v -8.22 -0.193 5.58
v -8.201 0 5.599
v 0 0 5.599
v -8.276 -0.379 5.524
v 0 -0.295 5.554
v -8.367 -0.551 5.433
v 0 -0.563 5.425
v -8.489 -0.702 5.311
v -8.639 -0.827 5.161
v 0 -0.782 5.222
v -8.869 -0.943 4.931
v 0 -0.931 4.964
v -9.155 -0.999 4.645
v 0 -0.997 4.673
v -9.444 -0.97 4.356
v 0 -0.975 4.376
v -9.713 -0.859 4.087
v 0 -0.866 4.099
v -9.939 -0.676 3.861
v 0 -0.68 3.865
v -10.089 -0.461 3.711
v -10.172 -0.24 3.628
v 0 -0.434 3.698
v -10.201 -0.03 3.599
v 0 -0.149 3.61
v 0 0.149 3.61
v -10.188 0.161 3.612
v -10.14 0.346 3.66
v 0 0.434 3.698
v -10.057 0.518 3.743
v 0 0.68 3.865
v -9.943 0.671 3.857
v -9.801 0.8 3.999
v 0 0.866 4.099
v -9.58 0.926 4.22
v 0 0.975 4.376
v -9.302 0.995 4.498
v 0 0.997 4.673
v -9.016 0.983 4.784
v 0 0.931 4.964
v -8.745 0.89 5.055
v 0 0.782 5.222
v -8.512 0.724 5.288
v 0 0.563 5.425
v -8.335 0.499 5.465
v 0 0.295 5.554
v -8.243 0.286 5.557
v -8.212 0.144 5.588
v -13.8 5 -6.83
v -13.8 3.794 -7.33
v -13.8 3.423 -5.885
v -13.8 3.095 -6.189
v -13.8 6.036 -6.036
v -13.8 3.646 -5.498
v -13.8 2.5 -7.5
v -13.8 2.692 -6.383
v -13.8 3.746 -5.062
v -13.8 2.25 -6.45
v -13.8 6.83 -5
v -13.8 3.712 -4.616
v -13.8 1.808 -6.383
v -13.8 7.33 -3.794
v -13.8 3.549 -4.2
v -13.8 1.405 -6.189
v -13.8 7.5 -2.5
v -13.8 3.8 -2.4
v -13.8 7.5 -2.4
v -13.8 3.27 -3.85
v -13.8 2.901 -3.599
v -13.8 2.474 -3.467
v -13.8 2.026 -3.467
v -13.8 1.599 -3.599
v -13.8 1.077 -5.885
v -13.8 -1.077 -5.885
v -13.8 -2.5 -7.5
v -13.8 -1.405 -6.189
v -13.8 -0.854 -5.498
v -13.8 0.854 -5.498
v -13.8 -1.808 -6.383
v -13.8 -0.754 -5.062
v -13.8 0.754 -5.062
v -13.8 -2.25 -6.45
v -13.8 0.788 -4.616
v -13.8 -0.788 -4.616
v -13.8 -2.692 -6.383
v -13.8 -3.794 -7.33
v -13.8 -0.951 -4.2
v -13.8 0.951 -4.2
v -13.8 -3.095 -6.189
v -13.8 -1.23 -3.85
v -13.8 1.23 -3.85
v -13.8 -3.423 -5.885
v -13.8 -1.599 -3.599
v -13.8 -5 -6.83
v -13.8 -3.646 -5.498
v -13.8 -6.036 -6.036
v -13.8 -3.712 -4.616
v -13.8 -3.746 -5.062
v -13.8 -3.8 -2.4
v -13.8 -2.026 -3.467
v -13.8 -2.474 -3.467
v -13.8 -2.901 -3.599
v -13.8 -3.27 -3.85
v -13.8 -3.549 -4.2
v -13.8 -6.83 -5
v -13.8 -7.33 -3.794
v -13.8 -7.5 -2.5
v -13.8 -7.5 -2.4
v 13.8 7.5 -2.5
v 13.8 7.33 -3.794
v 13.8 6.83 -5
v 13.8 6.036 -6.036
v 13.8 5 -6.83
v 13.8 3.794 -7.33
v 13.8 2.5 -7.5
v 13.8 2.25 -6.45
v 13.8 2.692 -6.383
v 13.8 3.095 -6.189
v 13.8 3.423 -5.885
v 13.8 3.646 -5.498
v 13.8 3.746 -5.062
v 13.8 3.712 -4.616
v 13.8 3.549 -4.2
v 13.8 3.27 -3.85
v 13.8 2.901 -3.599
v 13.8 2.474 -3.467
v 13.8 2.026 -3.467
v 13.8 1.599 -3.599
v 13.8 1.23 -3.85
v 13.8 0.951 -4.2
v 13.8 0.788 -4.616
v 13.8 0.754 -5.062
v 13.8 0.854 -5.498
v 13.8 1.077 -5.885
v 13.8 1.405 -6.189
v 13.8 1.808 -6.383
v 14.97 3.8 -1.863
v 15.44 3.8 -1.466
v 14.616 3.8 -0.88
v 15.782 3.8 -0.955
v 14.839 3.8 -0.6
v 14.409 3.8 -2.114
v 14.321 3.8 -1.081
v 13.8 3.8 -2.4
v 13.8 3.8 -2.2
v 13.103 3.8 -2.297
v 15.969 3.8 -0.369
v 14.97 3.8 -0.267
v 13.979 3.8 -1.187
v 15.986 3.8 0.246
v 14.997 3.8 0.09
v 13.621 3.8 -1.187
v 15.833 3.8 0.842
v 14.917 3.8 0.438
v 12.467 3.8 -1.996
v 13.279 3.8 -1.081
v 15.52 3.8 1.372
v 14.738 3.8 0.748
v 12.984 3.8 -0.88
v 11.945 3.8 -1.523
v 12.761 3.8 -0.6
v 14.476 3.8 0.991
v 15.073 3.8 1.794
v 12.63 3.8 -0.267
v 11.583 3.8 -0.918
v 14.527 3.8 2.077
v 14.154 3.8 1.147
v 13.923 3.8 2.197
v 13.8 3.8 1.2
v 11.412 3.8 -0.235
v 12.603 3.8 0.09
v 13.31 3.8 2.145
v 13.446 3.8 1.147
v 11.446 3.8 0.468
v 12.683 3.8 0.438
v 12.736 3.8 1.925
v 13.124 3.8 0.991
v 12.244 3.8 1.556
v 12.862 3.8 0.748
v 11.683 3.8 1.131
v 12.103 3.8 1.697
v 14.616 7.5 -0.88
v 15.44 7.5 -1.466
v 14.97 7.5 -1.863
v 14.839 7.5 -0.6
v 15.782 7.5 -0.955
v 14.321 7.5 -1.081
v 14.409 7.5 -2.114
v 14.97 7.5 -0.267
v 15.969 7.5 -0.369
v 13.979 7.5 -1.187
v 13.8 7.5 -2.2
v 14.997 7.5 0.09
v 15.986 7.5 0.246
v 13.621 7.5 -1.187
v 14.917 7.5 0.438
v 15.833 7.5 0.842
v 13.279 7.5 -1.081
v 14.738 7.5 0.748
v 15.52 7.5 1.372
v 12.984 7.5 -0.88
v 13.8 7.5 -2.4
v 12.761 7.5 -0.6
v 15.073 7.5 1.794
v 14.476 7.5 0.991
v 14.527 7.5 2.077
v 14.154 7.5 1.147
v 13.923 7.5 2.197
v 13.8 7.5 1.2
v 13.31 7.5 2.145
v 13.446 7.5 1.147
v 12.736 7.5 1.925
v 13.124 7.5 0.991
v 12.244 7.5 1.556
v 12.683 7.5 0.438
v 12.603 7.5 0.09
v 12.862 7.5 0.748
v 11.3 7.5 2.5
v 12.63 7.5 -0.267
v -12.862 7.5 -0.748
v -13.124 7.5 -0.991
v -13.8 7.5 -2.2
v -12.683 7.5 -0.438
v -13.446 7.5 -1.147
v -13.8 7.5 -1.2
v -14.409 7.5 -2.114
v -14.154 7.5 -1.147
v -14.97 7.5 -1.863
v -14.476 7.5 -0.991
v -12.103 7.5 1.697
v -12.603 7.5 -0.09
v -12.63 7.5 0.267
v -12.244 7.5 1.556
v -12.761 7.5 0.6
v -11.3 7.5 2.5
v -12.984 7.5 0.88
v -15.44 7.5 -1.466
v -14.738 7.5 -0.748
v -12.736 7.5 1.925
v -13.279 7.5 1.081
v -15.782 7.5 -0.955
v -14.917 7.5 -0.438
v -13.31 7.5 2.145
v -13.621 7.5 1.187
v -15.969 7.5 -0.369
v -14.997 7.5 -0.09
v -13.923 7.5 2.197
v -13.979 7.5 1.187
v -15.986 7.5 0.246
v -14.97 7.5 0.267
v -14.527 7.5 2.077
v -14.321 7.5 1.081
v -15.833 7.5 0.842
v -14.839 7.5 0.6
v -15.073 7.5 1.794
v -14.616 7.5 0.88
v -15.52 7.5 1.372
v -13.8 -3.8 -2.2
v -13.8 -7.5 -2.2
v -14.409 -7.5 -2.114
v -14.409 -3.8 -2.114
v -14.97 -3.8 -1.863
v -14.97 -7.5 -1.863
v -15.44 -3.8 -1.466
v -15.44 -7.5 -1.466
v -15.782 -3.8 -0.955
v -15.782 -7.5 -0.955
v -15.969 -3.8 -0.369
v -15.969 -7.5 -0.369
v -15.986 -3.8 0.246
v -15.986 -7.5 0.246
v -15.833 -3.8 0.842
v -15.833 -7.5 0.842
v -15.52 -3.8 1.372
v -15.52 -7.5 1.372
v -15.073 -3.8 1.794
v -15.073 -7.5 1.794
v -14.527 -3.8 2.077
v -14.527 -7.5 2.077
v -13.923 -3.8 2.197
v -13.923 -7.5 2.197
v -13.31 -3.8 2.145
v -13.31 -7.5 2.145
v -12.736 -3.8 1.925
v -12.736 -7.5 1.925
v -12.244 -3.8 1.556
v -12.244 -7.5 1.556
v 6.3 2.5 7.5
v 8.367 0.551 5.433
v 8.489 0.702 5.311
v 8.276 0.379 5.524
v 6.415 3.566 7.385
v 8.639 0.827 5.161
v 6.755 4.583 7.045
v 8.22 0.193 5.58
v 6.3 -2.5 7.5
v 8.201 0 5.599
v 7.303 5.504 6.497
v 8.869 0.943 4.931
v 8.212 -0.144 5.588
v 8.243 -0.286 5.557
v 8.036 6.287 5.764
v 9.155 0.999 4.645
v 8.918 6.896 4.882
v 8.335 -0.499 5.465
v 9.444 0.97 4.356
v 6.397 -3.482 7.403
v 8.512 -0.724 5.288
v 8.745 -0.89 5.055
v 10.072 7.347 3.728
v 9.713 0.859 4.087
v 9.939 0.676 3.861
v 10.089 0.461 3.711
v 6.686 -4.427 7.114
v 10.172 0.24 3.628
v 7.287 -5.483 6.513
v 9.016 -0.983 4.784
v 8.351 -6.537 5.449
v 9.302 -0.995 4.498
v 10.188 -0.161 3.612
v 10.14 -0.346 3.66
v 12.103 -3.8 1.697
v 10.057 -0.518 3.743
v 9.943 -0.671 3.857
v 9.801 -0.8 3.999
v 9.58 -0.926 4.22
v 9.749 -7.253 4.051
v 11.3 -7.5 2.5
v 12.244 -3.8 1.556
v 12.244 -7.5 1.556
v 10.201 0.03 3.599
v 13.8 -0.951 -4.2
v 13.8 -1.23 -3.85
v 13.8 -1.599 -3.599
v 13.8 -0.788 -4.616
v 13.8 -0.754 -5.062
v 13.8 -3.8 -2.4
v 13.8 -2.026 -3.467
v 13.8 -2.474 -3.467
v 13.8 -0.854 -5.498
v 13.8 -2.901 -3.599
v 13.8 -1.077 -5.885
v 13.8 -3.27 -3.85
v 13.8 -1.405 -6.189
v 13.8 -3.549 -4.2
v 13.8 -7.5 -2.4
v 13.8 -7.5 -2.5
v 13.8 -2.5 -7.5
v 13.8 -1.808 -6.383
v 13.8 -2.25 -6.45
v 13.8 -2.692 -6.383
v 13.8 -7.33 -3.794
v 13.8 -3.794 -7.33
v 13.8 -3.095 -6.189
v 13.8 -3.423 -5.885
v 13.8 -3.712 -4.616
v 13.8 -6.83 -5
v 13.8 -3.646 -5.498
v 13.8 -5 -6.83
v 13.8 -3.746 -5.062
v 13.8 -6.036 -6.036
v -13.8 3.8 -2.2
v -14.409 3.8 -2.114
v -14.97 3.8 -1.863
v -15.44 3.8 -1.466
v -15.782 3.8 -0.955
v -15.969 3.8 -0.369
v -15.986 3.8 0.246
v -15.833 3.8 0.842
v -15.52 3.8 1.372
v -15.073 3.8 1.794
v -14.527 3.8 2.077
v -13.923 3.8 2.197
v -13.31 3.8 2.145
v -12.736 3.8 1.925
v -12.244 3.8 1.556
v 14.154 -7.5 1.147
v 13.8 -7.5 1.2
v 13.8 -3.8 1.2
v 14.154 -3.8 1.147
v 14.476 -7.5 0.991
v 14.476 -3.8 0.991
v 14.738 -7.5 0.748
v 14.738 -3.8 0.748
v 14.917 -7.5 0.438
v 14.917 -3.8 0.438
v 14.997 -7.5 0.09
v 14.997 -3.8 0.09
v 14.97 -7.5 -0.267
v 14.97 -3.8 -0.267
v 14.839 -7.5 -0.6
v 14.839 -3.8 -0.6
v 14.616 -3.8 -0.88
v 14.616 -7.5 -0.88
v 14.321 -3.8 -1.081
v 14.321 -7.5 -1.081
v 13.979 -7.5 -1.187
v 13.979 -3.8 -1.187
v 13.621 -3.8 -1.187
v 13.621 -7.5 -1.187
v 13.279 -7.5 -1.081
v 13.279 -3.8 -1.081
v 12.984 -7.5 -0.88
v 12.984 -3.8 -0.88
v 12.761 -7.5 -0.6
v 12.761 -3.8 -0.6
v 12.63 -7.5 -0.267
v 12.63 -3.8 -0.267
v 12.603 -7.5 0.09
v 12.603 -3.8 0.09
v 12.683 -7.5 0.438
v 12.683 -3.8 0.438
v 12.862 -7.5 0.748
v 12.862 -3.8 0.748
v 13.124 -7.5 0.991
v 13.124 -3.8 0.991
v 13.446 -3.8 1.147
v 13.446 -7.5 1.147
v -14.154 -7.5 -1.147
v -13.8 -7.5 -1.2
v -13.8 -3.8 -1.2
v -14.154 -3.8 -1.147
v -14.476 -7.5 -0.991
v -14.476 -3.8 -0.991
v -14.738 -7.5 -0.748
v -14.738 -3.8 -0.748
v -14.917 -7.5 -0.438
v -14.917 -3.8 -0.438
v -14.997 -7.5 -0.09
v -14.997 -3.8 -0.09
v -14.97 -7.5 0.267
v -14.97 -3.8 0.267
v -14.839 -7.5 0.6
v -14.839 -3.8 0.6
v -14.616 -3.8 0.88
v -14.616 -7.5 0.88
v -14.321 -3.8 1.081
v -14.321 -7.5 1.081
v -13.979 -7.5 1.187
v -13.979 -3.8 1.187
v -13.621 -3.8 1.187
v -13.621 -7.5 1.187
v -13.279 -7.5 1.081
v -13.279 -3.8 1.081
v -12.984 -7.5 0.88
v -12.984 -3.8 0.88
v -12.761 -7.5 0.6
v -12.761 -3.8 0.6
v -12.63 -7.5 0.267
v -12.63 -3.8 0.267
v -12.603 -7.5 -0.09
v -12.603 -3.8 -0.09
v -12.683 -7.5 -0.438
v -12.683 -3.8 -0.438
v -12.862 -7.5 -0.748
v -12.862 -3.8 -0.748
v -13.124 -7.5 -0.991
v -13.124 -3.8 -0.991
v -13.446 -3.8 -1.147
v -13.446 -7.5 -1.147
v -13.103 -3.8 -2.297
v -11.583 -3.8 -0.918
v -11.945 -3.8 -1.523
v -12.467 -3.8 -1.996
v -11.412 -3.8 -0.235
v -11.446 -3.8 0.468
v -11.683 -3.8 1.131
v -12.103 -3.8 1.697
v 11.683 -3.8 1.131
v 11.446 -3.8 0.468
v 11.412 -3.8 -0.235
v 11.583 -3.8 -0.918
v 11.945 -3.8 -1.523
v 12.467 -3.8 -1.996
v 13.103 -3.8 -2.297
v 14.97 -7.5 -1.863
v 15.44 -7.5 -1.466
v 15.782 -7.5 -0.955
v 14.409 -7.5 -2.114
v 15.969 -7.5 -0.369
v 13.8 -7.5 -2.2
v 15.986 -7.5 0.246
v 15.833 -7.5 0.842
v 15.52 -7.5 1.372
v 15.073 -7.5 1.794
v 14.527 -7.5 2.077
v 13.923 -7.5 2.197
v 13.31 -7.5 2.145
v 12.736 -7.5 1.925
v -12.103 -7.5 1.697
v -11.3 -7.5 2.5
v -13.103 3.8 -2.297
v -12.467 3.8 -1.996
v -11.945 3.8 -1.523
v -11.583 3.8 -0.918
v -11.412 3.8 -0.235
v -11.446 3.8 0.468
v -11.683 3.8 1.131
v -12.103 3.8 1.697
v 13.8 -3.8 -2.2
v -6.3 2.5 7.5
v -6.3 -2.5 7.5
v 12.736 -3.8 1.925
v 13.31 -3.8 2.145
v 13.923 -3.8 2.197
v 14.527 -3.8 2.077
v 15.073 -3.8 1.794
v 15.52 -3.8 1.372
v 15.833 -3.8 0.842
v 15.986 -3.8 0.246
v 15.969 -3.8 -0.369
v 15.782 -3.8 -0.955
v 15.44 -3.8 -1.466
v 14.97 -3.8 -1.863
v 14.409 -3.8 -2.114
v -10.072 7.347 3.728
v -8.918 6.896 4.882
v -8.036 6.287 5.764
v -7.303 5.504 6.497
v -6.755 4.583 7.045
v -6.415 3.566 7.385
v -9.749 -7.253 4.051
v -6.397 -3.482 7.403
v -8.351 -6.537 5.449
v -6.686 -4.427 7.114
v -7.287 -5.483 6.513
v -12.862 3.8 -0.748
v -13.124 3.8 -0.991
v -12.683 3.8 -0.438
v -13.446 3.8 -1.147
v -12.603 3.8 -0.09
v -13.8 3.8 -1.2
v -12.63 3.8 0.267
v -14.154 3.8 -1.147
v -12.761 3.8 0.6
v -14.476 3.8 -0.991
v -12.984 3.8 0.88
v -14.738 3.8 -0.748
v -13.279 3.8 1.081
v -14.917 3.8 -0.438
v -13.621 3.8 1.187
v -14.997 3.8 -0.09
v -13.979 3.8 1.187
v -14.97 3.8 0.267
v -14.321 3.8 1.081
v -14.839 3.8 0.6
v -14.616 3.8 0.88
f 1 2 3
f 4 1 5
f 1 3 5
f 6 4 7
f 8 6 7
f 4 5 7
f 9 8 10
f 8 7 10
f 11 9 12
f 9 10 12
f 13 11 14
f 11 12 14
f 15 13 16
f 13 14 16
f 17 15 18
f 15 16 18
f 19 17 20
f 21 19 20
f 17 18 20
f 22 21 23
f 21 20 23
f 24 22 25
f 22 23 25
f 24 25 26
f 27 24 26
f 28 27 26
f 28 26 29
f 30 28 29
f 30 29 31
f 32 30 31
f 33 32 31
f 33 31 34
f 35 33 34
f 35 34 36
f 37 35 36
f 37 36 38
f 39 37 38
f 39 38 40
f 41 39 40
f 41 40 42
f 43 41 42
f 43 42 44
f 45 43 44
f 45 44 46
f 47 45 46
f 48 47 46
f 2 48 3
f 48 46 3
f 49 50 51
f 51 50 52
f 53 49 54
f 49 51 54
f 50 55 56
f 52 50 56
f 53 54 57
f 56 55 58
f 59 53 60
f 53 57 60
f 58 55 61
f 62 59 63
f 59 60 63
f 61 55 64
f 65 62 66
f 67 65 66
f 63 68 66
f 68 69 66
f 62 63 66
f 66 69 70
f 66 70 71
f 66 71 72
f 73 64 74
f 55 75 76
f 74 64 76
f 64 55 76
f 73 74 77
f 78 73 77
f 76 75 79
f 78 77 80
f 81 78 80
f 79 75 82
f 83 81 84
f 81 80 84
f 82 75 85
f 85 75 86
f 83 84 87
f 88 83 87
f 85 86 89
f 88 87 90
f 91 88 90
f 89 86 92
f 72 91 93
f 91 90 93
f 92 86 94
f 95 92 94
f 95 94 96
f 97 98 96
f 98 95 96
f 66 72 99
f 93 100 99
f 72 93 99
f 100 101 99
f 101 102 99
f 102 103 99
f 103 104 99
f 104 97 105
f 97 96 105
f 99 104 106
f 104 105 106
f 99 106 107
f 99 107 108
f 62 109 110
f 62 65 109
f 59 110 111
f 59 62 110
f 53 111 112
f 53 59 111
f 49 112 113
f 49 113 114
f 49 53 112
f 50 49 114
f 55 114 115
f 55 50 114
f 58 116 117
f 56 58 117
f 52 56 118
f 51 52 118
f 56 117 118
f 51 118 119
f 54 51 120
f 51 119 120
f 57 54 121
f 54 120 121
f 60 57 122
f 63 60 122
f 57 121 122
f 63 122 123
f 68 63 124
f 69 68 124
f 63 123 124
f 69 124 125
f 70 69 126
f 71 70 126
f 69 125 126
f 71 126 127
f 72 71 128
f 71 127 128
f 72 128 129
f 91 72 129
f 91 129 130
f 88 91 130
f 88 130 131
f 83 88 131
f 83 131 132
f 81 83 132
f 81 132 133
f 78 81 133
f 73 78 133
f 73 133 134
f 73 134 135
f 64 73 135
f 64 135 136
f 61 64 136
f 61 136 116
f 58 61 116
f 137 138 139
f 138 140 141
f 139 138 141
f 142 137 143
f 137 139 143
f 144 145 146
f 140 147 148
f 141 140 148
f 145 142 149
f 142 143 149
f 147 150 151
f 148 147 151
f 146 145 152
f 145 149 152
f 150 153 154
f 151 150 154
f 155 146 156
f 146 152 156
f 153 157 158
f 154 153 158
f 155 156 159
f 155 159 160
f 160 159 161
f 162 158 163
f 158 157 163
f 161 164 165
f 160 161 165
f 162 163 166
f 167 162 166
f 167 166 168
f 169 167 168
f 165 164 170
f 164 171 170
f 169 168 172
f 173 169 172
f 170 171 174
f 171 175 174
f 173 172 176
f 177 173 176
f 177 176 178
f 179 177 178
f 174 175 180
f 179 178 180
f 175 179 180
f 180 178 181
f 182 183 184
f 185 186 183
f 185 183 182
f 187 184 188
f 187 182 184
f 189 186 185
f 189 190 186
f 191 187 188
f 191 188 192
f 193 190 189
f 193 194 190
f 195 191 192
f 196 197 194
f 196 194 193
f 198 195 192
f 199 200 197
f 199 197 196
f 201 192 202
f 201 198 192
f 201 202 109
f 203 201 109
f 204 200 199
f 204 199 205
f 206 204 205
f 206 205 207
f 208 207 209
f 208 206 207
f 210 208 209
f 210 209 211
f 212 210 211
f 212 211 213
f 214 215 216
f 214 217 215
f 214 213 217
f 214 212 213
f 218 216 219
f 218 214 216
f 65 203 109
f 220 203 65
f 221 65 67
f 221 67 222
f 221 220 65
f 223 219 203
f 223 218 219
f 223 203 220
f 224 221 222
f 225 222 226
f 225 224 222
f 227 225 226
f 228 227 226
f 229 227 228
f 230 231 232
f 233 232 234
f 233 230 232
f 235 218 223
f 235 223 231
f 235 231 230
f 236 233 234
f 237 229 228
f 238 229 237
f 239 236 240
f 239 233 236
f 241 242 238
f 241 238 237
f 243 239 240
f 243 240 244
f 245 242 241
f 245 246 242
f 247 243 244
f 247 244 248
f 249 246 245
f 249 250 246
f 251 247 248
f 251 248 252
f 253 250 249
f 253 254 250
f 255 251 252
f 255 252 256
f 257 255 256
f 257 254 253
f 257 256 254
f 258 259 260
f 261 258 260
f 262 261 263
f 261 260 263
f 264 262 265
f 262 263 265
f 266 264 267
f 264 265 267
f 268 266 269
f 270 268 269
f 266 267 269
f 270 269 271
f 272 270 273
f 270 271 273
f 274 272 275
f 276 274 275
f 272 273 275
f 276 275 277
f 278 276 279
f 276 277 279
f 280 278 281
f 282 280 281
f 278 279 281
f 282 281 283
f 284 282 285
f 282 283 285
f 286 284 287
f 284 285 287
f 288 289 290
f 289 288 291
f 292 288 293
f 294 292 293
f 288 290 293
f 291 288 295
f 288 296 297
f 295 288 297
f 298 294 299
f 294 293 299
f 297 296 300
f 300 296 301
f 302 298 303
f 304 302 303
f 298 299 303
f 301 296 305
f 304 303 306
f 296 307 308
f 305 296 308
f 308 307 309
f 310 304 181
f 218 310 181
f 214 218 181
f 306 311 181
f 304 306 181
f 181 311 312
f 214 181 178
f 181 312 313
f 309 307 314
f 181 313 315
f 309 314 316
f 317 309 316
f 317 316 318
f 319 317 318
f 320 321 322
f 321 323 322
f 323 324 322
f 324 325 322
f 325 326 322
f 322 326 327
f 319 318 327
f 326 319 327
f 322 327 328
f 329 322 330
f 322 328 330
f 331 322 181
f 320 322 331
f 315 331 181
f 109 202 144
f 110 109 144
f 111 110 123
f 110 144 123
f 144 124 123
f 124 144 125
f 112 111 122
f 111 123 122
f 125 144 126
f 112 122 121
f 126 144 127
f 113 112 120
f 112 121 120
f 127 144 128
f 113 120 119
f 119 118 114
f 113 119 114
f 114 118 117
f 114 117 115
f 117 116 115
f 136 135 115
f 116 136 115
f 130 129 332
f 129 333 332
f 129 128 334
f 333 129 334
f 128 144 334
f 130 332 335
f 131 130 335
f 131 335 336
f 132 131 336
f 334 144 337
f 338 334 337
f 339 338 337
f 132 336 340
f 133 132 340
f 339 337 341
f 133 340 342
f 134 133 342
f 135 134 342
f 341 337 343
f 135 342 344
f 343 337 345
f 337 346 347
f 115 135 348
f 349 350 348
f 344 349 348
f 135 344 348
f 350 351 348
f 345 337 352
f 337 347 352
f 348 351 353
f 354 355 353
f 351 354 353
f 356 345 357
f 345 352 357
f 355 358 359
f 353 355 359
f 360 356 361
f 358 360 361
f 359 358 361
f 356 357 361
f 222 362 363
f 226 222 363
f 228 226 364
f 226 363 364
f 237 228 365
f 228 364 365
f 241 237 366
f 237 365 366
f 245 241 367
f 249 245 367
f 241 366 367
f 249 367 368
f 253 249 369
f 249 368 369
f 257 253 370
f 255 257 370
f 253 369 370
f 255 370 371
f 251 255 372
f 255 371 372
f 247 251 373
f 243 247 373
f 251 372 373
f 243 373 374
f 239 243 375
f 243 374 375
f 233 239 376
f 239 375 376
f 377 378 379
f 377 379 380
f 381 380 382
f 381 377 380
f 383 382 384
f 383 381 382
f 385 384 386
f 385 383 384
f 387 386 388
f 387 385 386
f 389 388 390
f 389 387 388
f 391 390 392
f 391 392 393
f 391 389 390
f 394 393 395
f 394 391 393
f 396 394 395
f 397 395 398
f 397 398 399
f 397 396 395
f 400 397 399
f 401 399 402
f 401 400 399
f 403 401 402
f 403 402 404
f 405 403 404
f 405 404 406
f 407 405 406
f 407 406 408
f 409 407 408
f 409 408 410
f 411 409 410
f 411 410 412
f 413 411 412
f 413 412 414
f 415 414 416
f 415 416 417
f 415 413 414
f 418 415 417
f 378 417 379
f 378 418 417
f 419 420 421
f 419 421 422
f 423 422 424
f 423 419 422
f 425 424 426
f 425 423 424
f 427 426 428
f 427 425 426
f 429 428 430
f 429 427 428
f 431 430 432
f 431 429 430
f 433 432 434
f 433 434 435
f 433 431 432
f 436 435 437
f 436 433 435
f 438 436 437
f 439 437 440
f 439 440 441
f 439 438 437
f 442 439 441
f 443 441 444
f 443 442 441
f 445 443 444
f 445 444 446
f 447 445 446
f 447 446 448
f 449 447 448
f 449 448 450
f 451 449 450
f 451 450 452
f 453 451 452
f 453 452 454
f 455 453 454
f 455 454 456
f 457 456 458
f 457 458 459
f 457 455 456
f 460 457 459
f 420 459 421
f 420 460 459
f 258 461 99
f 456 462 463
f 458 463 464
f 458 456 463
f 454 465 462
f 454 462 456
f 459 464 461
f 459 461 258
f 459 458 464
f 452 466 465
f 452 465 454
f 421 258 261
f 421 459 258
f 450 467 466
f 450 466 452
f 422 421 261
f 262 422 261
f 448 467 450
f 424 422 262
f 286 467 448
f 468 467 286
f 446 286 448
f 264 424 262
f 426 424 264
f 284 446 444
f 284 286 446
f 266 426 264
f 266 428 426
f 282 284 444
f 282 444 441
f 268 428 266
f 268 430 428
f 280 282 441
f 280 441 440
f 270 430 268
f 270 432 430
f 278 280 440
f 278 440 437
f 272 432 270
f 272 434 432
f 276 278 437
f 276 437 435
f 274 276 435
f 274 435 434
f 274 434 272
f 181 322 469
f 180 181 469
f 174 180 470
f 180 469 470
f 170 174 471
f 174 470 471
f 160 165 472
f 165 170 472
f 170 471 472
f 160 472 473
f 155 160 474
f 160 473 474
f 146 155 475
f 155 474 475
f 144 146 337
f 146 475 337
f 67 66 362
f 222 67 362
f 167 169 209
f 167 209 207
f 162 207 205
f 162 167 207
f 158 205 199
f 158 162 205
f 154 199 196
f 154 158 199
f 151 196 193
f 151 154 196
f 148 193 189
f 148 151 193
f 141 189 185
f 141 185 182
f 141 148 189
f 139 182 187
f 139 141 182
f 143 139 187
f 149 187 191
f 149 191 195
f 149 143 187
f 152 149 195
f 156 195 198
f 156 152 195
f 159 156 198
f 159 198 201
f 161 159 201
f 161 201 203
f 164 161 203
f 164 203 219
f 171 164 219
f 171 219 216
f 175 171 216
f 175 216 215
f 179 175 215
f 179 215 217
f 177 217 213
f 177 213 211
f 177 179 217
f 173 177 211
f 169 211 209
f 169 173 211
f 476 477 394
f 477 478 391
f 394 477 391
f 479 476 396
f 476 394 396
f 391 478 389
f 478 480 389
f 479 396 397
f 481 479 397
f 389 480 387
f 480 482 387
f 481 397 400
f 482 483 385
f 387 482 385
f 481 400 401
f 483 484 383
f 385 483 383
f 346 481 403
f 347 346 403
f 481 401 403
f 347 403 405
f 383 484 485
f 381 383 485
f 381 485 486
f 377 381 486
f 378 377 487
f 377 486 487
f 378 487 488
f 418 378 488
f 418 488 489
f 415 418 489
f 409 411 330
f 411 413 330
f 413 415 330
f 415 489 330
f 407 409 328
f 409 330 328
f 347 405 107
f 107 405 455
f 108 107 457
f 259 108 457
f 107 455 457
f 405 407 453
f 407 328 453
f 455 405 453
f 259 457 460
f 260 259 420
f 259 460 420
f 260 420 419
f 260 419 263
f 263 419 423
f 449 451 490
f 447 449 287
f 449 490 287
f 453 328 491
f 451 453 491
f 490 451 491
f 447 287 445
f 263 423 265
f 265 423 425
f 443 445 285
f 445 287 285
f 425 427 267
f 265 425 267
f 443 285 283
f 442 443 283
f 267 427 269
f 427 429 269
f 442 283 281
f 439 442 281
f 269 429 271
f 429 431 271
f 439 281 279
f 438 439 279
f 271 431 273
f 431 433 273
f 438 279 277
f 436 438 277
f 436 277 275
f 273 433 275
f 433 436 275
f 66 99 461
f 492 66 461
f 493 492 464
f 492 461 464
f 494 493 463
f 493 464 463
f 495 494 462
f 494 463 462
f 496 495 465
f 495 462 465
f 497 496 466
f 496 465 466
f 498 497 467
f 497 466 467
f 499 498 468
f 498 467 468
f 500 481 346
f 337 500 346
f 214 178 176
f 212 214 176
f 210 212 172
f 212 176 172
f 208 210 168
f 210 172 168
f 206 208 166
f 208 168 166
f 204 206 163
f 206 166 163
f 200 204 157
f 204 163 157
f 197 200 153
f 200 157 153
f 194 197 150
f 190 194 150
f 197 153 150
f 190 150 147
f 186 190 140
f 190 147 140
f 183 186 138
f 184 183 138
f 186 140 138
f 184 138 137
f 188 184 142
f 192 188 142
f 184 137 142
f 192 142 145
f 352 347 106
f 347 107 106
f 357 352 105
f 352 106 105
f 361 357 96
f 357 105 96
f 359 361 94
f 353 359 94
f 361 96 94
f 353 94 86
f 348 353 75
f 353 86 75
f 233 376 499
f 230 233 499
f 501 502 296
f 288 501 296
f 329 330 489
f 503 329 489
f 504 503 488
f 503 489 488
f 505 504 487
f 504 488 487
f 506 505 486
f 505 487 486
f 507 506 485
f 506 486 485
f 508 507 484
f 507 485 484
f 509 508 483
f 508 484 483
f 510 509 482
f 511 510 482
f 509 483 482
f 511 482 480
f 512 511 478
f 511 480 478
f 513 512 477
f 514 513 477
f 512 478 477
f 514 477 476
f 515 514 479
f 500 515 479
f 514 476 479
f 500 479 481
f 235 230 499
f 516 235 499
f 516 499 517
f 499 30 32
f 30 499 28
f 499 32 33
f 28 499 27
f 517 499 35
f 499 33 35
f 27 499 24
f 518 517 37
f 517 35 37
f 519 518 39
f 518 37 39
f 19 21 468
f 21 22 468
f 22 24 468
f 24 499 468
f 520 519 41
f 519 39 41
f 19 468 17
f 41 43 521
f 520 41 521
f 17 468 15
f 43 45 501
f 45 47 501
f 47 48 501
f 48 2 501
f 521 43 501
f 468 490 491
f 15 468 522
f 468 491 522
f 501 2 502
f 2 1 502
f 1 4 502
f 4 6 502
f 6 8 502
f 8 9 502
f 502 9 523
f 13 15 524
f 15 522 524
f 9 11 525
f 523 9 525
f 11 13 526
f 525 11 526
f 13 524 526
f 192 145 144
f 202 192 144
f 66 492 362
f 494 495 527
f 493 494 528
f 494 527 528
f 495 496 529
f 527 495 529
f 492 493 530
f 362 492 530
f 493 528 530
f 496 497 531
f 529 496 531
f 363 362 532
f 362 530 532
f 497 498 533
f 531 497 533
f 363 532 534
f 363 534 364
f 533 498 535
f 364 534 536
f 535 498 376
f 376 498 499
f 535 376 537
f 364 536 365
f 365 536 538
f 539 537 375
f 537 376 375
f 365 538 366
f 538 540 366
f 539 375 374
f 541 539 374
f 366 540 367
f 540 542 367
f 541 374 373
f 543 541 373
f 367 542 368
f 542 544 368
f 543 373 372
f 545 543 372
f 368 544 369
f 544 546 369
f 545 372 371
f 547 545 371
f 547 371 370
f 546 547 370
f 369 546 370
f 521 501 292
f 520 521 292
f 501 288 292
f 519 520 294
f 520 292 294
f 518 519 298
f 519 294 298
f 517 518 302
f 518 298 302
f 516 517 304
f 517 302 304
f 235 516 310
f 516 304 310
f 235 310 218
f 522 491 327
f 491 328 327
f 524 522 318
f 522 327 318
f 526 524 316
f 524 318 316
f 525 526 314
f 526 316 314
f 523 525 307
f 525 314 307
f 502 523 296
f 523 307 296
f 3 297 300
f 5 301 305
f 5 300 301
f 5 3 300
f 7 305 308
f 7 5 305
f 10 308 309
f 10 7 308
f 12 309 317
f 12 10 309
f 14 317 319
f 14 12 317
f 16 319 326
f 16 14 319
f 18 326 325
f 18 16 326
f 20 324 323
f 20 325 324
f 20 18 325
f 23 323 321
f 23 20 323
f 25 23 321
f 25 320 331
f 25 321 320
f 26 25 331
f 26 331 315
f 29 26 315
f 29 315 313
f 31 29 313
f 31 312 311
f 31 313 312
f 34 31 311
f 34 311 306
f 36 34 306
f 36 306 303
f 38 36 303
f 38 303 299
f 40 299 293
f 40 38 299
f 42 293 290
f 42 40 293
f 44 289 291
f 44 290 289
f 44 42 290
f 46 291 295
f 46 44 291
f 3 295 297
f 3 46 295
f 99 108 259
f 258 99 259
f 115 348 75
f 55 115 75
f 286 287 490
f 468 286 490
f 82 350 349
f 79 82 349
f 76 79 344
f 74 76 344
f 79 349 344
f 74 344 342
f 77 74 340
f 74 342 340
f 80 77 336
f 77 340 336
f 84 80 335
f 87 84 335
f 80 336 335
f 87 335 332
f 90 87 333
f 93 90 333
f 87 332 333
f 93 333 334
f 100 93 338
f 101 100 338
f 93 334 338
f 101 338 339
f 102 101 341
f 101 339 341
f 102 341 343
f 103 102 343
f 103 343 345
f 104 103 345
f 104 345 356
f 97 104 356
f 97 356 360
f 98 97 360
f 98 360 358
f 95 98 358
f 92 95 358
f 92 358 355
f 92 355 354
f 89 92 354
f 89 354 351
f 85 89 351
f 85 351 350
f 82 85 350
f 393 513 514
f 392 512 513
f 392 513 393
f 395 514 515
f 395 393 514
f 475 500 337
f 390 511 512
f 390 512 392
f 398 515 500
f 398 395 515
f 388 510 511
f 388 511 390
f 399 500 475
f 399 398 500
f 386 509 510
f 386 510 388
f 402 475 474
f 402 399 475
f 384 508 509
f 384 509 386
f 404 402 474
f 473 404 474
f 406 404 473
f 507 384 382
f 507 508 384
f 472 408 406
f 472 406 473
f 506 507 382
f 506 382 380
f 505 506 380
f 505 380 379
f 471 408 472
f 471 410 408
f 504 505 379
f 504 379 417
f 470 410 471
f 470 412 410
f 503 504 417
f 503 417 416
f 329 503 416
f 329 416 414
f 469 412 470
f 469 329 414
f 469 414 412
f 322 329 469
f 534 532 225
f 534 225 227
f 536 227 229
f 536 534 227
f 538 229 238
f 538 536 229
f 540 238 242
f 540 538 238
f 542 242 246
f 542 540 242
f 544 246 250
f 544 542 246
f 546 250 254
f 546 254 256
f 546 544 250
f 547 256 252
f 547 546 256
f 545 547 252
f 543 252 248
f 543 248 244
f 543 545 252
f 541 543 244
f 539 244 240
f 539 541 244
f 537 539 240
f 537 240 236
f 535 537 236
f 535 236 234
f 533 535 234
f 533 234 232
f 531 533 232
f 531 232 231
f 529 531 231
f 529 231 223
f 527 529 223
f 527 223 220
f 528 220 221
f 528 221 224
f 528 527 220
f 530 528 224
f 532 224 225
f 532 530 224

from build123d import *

# Parameters (mm, degrees)
BOSS_EXTRUDE1_DEPTH            = 7.5
BOSS_EXTRUDE1_DEPTH_BACK       = 7.5
CUT_EXTRUDE3_REACH             = 31.568
SKETCH5_R                      = 1.5
FILLET1_R                      = 5
CUT_EXTRUDE2_REACH             = 19.405
SKETCH3_R                      = 1
CUT_EXTRUDE2_DIRECTION_2_REACH = 19.405
FILLET2_R                      = 5
BOSS_EXTRUDE2_START            = 3.8
SKETCH6_R                      = 1.2
BOSS_EXTRUDE2_DEPTH            = 3.7
BOSS_EXTRUDE3_START            = -7.5
SKETCH6_4_R                    = 1.2
BOSS_EXTRUDE3_DEPTH            = 3.7


with BuildPart() as part:
    # Sketch1 → Boss-Extrude1 (new, two sides: drawn at the far end of the back side and taken through both)
    with BuildSketch(Plane(origin=(0, 0, 0), x_dir=(-1, 0, 0), z_dir=(0, 1, 0)).offset(-BOSS_EXTRUDE1_DEPTH_BACK)):
        with BuildLine():
            Line((6.3, 7.5), (-6.3, 7.5))
            Line((-6.3, 7.5), (-12.102943725, 1.697056275))
            ThreePointArc((-12.102943725, 1.697056275), (-11.582689122, -0.918440238), (-13.8, -2.4))
            Line((-13.8, -2.4), (-13.8, -7.5))
            Line((-13.8, -7.5), (13.8, -7.5))
            Line((13.8, -7.5), (13.8, -2.4))
            ThreePointArc((13.8, -2.4), (11.582689122, -0.918440238), (12.102943725, 1.697056275))
            Line((12.102943725, 1.697056275), (6.3, 7.5))
        make_face()
    extrude(amount=BOSS_EXTRUDE1_DEPTH + BOSS_EXTRUDE1_DEPTH_BACK)

    # Sketch5 → Cut-Extrude3 (cut, up to next)
    with BuildSketch(Plane.YZ.offset(13.8), mode=Mode.PRIVATE) as cut_extrude3_sk1:
        with Locations(Location((-2.25, -4.95, 0), (0, 0, 270))):
            Circle(SKETCH5_R)
    cut_extrude3_tool1 = extrude(cut_extrude3_sk1.sketch, amount=-CUT_EXTRUDE3_REACH, mode=Mode.PRIVATE) & part.part
    # Sketch5 → Cut-Extrude3 (cut, up to next)
    with BuildSketch(Plane.YZ.offset(13.8), mode=Mode.PRIVATE) as cut_extrude3_sk2:
        with Locations(Location((2.25, -4.95, 0), (0, 0, 270))):
            Circle(SKETCH5_R)
    cut_extrude3_tool2 = extrude(cut_extrude3_sk2.sketch, amount=-CUT_EXTRUDE3_REACH, mode=Mode.PRIVATE) & part.part
    add(cut_extrude3_tool1.solids().sort_by_distance((13.8, -2.25, -4.95))[0], mode=Mode.SUBTRACT)
    add(cut_extrude3_tool2.solids().sort_by_distance((13.8, 2.25, -4.95))[0], mode=Mode.SUBTRACT)

    # Fillet1
    fillet1_edges = [part.edges().sort_by_distance(p)[0] for p in [
        (0, -7.5, -7.5),
        (0, 7.5, -7.5),
    ]]
    fillet(fillet1_edges, radius=FILLET1_R)

    # Cut-Extrude2: up to this plane
    cut_extrude2_end = Plane(origin=(-6.9, -7.5, 6.9), z_dir=(0.7071067811865475, 0, -0.7071067811865477))
    # Sketch3 → Cut-Extrude2 (cut, up to the surface)
    with BuildSketch(Plane.YZ, mode=Mode.PRIVATE) as cut_extrude2_sk1:
        with Locations(Location((0, 4.598528137, 0), (0, 0, 90))):
            Circle(SKETCH3_R)
    cut_extrude2_tool1 = split(extrude(cut_extrude2_sk1.sketch, amount=-CUT_EXTRUDE2_REACH, mode=Mode.PRIVATE), bisect_by=cut_extrude2_end, keep=Keep.BOTH, mode=Mode.PRIVATE)
    add(cut_extrude2_tool1.solids().sort_by_distance((0, 0, 4.598528))[0], mode=Mode.SUBTRACT)

    # Cut-Extrude2 direction 2: up to this plane
    cut_extrude2_direction_2_end = Plane(origin=(6.9, -7.5, 6.9), z_dir=(-0.7071067811865475, 0, -0.7071067811865476))
    # Sketch3 → Cut-Extrude2 direction 2 (cut, up to the surface)
    with BuildSketch(Plane.YZ, mode=Mode.PRIVATE) as cut_extrude2_direction_2_sk1:
        with Locations(Location((0, 4.598528137, 0), (0, 0, 90))):
            Circle(SKETCH3_R)
    cut_extrude2_direction_2_tool1 = split(extrude(cut_extrude2_direction_2_sk1.sketch, amount=CUT_EXTRUDE2_DIRECTION_2_REACH, mode=Mode.PRIVATE), bisect_by=cut_extrude2_direction_2_end, keep=Keep.BOTH, mode=Mode.PRIVATE)
    add(cut_extrude2_direction_2_tool1.solids().sort_by_distance((0, 0, 4.598528))[0], mode=Mode.SUBTRACT)

    # Fillet2
    fillet2_edges = [part.edges().sort_by_distance(p)[0] for p in [
        (0, 7.5, 7.5),
        (0, -7.5, 7.5),
    ]]
    fillet(fillet2_edges, radius=FILLET2_R)

    # Sketch6 → Boss-Extrude2 (add)
    # profile 1 of 2: a face of its own
    with BuildSketch(Plane(origin=(0, 0, 0), x_dir=(-1, 0, 0), z_dir=(0, 1, 0)).offset(BOSS_EXTRUDE2_START)):
        with BuildLine():
            Line((-12.102943725, 1.697056275), (-12.244365081, 1.555634919))
            ThreePointArc((-12.244365081, 1.555634919), (-15.832534972, 0.841903551), (-13.8, -2.2))
            Line((-13.8, -2.2), (-13.8, -2.4))
            ThreePointArc((-13.8, -2.4), (-11.582689122, -0.918440238), (-12.102943725, 1.697056275))
        make_face()
        with Locations(Location((-13.8, 0, 0), (0, 0, 90))):
            Circle(SKETCH6_R, mode=Mode.SUBTRACT)
    # profile 2 of 2: a face of its own
    with BuildSketch(Plane(origin=(0, 0, 0), x_dir=(-1, 0, 0), z_dir=(0, 1, 0)).offset(BOSS_EXTRUDE2_START)):
        with BuildLine():
            Line((13.8, -2.4), (13.8, -2.2))
            ThreePointArc((13.8, -2.2), (15.832534972, 0.841903551), (12.244365081, 1.555634919))
            Line((12.244365081, 1.555634919), (12.102943725, 1.697056275))
            ThreePointArc((12.102943725, 1.697056275), (11.582689122, -0.918440238), (13.8, -2.4))
        make_face()
        with Locations(Location((13.8, 0, 0), (0, 0, 270))):
            Circle(SKETCH6_R, mode=Mode.SUBTRACT)
    extrude(amount=BOSS_EXTRUDE2_DEPTH)

    # Sketch6<4> → Boss-Extrude3 (add)
    # profile 1 of 2: a face of its own
    with BuildSketch(Plane(origin=(0, 0, 0), x_dir=(-1, 0, 0), z_dir=(0, 1, 0)).offset(BOSS_EXTRUDE3_START)):
        with BuildLine():
            Line((-12.102943725, 1.697056275), (-12.244365081, 1.555634919))
            ThreePointArc((-12.244365081, 1.555634919), (-15.832534972, 0.841903551), (-13.8, -2.2))
            Line((-13.8, -2.2), (-13.8, -2.4))
            ThreePointArc((-13.8, -2.4), (-11.582689122, -0.918440238), (-12.102943725, 1.697056275))
        make_face()
        with Locations(Location((-13.8, 0, 0), (0, 0, 90))):
            Circle(SKETCH6_4_R, mode=Mode.SUBTRACT)
    # profile 2 of 2: a face of its own
    with BuildSketch(Plane(origin=(0, 0, 0), x_dir=(-1, 0, 0), z_dir=(0, 1, 0)).offset(BOSS_EXTRUDE3_START)):
        with BuildLine():
            Line((13.8, -2.4), (13.8, -2.2))
            ThreePointArc((13.8, -2.2), (15.832534972, 0.841903551), (12.244365081, 1.555634919))
            Line((12.244365081, 1.555634919), (12.102943725, 1.697056275))
            ThreePointArc((12.102943725, 1.697056275), (11.582689122, -0.918440238), (13.8, -2.4))
        make_face()
        with Locations(Location((13.8, 0, 0), (0, 0, 270))):
            Circle(SKETCH6_4_R, mode=Mode.SUBTRACT)
    extrude(amount=BOSS_EXTRUDE3_DEPTH)


solid = part.part
